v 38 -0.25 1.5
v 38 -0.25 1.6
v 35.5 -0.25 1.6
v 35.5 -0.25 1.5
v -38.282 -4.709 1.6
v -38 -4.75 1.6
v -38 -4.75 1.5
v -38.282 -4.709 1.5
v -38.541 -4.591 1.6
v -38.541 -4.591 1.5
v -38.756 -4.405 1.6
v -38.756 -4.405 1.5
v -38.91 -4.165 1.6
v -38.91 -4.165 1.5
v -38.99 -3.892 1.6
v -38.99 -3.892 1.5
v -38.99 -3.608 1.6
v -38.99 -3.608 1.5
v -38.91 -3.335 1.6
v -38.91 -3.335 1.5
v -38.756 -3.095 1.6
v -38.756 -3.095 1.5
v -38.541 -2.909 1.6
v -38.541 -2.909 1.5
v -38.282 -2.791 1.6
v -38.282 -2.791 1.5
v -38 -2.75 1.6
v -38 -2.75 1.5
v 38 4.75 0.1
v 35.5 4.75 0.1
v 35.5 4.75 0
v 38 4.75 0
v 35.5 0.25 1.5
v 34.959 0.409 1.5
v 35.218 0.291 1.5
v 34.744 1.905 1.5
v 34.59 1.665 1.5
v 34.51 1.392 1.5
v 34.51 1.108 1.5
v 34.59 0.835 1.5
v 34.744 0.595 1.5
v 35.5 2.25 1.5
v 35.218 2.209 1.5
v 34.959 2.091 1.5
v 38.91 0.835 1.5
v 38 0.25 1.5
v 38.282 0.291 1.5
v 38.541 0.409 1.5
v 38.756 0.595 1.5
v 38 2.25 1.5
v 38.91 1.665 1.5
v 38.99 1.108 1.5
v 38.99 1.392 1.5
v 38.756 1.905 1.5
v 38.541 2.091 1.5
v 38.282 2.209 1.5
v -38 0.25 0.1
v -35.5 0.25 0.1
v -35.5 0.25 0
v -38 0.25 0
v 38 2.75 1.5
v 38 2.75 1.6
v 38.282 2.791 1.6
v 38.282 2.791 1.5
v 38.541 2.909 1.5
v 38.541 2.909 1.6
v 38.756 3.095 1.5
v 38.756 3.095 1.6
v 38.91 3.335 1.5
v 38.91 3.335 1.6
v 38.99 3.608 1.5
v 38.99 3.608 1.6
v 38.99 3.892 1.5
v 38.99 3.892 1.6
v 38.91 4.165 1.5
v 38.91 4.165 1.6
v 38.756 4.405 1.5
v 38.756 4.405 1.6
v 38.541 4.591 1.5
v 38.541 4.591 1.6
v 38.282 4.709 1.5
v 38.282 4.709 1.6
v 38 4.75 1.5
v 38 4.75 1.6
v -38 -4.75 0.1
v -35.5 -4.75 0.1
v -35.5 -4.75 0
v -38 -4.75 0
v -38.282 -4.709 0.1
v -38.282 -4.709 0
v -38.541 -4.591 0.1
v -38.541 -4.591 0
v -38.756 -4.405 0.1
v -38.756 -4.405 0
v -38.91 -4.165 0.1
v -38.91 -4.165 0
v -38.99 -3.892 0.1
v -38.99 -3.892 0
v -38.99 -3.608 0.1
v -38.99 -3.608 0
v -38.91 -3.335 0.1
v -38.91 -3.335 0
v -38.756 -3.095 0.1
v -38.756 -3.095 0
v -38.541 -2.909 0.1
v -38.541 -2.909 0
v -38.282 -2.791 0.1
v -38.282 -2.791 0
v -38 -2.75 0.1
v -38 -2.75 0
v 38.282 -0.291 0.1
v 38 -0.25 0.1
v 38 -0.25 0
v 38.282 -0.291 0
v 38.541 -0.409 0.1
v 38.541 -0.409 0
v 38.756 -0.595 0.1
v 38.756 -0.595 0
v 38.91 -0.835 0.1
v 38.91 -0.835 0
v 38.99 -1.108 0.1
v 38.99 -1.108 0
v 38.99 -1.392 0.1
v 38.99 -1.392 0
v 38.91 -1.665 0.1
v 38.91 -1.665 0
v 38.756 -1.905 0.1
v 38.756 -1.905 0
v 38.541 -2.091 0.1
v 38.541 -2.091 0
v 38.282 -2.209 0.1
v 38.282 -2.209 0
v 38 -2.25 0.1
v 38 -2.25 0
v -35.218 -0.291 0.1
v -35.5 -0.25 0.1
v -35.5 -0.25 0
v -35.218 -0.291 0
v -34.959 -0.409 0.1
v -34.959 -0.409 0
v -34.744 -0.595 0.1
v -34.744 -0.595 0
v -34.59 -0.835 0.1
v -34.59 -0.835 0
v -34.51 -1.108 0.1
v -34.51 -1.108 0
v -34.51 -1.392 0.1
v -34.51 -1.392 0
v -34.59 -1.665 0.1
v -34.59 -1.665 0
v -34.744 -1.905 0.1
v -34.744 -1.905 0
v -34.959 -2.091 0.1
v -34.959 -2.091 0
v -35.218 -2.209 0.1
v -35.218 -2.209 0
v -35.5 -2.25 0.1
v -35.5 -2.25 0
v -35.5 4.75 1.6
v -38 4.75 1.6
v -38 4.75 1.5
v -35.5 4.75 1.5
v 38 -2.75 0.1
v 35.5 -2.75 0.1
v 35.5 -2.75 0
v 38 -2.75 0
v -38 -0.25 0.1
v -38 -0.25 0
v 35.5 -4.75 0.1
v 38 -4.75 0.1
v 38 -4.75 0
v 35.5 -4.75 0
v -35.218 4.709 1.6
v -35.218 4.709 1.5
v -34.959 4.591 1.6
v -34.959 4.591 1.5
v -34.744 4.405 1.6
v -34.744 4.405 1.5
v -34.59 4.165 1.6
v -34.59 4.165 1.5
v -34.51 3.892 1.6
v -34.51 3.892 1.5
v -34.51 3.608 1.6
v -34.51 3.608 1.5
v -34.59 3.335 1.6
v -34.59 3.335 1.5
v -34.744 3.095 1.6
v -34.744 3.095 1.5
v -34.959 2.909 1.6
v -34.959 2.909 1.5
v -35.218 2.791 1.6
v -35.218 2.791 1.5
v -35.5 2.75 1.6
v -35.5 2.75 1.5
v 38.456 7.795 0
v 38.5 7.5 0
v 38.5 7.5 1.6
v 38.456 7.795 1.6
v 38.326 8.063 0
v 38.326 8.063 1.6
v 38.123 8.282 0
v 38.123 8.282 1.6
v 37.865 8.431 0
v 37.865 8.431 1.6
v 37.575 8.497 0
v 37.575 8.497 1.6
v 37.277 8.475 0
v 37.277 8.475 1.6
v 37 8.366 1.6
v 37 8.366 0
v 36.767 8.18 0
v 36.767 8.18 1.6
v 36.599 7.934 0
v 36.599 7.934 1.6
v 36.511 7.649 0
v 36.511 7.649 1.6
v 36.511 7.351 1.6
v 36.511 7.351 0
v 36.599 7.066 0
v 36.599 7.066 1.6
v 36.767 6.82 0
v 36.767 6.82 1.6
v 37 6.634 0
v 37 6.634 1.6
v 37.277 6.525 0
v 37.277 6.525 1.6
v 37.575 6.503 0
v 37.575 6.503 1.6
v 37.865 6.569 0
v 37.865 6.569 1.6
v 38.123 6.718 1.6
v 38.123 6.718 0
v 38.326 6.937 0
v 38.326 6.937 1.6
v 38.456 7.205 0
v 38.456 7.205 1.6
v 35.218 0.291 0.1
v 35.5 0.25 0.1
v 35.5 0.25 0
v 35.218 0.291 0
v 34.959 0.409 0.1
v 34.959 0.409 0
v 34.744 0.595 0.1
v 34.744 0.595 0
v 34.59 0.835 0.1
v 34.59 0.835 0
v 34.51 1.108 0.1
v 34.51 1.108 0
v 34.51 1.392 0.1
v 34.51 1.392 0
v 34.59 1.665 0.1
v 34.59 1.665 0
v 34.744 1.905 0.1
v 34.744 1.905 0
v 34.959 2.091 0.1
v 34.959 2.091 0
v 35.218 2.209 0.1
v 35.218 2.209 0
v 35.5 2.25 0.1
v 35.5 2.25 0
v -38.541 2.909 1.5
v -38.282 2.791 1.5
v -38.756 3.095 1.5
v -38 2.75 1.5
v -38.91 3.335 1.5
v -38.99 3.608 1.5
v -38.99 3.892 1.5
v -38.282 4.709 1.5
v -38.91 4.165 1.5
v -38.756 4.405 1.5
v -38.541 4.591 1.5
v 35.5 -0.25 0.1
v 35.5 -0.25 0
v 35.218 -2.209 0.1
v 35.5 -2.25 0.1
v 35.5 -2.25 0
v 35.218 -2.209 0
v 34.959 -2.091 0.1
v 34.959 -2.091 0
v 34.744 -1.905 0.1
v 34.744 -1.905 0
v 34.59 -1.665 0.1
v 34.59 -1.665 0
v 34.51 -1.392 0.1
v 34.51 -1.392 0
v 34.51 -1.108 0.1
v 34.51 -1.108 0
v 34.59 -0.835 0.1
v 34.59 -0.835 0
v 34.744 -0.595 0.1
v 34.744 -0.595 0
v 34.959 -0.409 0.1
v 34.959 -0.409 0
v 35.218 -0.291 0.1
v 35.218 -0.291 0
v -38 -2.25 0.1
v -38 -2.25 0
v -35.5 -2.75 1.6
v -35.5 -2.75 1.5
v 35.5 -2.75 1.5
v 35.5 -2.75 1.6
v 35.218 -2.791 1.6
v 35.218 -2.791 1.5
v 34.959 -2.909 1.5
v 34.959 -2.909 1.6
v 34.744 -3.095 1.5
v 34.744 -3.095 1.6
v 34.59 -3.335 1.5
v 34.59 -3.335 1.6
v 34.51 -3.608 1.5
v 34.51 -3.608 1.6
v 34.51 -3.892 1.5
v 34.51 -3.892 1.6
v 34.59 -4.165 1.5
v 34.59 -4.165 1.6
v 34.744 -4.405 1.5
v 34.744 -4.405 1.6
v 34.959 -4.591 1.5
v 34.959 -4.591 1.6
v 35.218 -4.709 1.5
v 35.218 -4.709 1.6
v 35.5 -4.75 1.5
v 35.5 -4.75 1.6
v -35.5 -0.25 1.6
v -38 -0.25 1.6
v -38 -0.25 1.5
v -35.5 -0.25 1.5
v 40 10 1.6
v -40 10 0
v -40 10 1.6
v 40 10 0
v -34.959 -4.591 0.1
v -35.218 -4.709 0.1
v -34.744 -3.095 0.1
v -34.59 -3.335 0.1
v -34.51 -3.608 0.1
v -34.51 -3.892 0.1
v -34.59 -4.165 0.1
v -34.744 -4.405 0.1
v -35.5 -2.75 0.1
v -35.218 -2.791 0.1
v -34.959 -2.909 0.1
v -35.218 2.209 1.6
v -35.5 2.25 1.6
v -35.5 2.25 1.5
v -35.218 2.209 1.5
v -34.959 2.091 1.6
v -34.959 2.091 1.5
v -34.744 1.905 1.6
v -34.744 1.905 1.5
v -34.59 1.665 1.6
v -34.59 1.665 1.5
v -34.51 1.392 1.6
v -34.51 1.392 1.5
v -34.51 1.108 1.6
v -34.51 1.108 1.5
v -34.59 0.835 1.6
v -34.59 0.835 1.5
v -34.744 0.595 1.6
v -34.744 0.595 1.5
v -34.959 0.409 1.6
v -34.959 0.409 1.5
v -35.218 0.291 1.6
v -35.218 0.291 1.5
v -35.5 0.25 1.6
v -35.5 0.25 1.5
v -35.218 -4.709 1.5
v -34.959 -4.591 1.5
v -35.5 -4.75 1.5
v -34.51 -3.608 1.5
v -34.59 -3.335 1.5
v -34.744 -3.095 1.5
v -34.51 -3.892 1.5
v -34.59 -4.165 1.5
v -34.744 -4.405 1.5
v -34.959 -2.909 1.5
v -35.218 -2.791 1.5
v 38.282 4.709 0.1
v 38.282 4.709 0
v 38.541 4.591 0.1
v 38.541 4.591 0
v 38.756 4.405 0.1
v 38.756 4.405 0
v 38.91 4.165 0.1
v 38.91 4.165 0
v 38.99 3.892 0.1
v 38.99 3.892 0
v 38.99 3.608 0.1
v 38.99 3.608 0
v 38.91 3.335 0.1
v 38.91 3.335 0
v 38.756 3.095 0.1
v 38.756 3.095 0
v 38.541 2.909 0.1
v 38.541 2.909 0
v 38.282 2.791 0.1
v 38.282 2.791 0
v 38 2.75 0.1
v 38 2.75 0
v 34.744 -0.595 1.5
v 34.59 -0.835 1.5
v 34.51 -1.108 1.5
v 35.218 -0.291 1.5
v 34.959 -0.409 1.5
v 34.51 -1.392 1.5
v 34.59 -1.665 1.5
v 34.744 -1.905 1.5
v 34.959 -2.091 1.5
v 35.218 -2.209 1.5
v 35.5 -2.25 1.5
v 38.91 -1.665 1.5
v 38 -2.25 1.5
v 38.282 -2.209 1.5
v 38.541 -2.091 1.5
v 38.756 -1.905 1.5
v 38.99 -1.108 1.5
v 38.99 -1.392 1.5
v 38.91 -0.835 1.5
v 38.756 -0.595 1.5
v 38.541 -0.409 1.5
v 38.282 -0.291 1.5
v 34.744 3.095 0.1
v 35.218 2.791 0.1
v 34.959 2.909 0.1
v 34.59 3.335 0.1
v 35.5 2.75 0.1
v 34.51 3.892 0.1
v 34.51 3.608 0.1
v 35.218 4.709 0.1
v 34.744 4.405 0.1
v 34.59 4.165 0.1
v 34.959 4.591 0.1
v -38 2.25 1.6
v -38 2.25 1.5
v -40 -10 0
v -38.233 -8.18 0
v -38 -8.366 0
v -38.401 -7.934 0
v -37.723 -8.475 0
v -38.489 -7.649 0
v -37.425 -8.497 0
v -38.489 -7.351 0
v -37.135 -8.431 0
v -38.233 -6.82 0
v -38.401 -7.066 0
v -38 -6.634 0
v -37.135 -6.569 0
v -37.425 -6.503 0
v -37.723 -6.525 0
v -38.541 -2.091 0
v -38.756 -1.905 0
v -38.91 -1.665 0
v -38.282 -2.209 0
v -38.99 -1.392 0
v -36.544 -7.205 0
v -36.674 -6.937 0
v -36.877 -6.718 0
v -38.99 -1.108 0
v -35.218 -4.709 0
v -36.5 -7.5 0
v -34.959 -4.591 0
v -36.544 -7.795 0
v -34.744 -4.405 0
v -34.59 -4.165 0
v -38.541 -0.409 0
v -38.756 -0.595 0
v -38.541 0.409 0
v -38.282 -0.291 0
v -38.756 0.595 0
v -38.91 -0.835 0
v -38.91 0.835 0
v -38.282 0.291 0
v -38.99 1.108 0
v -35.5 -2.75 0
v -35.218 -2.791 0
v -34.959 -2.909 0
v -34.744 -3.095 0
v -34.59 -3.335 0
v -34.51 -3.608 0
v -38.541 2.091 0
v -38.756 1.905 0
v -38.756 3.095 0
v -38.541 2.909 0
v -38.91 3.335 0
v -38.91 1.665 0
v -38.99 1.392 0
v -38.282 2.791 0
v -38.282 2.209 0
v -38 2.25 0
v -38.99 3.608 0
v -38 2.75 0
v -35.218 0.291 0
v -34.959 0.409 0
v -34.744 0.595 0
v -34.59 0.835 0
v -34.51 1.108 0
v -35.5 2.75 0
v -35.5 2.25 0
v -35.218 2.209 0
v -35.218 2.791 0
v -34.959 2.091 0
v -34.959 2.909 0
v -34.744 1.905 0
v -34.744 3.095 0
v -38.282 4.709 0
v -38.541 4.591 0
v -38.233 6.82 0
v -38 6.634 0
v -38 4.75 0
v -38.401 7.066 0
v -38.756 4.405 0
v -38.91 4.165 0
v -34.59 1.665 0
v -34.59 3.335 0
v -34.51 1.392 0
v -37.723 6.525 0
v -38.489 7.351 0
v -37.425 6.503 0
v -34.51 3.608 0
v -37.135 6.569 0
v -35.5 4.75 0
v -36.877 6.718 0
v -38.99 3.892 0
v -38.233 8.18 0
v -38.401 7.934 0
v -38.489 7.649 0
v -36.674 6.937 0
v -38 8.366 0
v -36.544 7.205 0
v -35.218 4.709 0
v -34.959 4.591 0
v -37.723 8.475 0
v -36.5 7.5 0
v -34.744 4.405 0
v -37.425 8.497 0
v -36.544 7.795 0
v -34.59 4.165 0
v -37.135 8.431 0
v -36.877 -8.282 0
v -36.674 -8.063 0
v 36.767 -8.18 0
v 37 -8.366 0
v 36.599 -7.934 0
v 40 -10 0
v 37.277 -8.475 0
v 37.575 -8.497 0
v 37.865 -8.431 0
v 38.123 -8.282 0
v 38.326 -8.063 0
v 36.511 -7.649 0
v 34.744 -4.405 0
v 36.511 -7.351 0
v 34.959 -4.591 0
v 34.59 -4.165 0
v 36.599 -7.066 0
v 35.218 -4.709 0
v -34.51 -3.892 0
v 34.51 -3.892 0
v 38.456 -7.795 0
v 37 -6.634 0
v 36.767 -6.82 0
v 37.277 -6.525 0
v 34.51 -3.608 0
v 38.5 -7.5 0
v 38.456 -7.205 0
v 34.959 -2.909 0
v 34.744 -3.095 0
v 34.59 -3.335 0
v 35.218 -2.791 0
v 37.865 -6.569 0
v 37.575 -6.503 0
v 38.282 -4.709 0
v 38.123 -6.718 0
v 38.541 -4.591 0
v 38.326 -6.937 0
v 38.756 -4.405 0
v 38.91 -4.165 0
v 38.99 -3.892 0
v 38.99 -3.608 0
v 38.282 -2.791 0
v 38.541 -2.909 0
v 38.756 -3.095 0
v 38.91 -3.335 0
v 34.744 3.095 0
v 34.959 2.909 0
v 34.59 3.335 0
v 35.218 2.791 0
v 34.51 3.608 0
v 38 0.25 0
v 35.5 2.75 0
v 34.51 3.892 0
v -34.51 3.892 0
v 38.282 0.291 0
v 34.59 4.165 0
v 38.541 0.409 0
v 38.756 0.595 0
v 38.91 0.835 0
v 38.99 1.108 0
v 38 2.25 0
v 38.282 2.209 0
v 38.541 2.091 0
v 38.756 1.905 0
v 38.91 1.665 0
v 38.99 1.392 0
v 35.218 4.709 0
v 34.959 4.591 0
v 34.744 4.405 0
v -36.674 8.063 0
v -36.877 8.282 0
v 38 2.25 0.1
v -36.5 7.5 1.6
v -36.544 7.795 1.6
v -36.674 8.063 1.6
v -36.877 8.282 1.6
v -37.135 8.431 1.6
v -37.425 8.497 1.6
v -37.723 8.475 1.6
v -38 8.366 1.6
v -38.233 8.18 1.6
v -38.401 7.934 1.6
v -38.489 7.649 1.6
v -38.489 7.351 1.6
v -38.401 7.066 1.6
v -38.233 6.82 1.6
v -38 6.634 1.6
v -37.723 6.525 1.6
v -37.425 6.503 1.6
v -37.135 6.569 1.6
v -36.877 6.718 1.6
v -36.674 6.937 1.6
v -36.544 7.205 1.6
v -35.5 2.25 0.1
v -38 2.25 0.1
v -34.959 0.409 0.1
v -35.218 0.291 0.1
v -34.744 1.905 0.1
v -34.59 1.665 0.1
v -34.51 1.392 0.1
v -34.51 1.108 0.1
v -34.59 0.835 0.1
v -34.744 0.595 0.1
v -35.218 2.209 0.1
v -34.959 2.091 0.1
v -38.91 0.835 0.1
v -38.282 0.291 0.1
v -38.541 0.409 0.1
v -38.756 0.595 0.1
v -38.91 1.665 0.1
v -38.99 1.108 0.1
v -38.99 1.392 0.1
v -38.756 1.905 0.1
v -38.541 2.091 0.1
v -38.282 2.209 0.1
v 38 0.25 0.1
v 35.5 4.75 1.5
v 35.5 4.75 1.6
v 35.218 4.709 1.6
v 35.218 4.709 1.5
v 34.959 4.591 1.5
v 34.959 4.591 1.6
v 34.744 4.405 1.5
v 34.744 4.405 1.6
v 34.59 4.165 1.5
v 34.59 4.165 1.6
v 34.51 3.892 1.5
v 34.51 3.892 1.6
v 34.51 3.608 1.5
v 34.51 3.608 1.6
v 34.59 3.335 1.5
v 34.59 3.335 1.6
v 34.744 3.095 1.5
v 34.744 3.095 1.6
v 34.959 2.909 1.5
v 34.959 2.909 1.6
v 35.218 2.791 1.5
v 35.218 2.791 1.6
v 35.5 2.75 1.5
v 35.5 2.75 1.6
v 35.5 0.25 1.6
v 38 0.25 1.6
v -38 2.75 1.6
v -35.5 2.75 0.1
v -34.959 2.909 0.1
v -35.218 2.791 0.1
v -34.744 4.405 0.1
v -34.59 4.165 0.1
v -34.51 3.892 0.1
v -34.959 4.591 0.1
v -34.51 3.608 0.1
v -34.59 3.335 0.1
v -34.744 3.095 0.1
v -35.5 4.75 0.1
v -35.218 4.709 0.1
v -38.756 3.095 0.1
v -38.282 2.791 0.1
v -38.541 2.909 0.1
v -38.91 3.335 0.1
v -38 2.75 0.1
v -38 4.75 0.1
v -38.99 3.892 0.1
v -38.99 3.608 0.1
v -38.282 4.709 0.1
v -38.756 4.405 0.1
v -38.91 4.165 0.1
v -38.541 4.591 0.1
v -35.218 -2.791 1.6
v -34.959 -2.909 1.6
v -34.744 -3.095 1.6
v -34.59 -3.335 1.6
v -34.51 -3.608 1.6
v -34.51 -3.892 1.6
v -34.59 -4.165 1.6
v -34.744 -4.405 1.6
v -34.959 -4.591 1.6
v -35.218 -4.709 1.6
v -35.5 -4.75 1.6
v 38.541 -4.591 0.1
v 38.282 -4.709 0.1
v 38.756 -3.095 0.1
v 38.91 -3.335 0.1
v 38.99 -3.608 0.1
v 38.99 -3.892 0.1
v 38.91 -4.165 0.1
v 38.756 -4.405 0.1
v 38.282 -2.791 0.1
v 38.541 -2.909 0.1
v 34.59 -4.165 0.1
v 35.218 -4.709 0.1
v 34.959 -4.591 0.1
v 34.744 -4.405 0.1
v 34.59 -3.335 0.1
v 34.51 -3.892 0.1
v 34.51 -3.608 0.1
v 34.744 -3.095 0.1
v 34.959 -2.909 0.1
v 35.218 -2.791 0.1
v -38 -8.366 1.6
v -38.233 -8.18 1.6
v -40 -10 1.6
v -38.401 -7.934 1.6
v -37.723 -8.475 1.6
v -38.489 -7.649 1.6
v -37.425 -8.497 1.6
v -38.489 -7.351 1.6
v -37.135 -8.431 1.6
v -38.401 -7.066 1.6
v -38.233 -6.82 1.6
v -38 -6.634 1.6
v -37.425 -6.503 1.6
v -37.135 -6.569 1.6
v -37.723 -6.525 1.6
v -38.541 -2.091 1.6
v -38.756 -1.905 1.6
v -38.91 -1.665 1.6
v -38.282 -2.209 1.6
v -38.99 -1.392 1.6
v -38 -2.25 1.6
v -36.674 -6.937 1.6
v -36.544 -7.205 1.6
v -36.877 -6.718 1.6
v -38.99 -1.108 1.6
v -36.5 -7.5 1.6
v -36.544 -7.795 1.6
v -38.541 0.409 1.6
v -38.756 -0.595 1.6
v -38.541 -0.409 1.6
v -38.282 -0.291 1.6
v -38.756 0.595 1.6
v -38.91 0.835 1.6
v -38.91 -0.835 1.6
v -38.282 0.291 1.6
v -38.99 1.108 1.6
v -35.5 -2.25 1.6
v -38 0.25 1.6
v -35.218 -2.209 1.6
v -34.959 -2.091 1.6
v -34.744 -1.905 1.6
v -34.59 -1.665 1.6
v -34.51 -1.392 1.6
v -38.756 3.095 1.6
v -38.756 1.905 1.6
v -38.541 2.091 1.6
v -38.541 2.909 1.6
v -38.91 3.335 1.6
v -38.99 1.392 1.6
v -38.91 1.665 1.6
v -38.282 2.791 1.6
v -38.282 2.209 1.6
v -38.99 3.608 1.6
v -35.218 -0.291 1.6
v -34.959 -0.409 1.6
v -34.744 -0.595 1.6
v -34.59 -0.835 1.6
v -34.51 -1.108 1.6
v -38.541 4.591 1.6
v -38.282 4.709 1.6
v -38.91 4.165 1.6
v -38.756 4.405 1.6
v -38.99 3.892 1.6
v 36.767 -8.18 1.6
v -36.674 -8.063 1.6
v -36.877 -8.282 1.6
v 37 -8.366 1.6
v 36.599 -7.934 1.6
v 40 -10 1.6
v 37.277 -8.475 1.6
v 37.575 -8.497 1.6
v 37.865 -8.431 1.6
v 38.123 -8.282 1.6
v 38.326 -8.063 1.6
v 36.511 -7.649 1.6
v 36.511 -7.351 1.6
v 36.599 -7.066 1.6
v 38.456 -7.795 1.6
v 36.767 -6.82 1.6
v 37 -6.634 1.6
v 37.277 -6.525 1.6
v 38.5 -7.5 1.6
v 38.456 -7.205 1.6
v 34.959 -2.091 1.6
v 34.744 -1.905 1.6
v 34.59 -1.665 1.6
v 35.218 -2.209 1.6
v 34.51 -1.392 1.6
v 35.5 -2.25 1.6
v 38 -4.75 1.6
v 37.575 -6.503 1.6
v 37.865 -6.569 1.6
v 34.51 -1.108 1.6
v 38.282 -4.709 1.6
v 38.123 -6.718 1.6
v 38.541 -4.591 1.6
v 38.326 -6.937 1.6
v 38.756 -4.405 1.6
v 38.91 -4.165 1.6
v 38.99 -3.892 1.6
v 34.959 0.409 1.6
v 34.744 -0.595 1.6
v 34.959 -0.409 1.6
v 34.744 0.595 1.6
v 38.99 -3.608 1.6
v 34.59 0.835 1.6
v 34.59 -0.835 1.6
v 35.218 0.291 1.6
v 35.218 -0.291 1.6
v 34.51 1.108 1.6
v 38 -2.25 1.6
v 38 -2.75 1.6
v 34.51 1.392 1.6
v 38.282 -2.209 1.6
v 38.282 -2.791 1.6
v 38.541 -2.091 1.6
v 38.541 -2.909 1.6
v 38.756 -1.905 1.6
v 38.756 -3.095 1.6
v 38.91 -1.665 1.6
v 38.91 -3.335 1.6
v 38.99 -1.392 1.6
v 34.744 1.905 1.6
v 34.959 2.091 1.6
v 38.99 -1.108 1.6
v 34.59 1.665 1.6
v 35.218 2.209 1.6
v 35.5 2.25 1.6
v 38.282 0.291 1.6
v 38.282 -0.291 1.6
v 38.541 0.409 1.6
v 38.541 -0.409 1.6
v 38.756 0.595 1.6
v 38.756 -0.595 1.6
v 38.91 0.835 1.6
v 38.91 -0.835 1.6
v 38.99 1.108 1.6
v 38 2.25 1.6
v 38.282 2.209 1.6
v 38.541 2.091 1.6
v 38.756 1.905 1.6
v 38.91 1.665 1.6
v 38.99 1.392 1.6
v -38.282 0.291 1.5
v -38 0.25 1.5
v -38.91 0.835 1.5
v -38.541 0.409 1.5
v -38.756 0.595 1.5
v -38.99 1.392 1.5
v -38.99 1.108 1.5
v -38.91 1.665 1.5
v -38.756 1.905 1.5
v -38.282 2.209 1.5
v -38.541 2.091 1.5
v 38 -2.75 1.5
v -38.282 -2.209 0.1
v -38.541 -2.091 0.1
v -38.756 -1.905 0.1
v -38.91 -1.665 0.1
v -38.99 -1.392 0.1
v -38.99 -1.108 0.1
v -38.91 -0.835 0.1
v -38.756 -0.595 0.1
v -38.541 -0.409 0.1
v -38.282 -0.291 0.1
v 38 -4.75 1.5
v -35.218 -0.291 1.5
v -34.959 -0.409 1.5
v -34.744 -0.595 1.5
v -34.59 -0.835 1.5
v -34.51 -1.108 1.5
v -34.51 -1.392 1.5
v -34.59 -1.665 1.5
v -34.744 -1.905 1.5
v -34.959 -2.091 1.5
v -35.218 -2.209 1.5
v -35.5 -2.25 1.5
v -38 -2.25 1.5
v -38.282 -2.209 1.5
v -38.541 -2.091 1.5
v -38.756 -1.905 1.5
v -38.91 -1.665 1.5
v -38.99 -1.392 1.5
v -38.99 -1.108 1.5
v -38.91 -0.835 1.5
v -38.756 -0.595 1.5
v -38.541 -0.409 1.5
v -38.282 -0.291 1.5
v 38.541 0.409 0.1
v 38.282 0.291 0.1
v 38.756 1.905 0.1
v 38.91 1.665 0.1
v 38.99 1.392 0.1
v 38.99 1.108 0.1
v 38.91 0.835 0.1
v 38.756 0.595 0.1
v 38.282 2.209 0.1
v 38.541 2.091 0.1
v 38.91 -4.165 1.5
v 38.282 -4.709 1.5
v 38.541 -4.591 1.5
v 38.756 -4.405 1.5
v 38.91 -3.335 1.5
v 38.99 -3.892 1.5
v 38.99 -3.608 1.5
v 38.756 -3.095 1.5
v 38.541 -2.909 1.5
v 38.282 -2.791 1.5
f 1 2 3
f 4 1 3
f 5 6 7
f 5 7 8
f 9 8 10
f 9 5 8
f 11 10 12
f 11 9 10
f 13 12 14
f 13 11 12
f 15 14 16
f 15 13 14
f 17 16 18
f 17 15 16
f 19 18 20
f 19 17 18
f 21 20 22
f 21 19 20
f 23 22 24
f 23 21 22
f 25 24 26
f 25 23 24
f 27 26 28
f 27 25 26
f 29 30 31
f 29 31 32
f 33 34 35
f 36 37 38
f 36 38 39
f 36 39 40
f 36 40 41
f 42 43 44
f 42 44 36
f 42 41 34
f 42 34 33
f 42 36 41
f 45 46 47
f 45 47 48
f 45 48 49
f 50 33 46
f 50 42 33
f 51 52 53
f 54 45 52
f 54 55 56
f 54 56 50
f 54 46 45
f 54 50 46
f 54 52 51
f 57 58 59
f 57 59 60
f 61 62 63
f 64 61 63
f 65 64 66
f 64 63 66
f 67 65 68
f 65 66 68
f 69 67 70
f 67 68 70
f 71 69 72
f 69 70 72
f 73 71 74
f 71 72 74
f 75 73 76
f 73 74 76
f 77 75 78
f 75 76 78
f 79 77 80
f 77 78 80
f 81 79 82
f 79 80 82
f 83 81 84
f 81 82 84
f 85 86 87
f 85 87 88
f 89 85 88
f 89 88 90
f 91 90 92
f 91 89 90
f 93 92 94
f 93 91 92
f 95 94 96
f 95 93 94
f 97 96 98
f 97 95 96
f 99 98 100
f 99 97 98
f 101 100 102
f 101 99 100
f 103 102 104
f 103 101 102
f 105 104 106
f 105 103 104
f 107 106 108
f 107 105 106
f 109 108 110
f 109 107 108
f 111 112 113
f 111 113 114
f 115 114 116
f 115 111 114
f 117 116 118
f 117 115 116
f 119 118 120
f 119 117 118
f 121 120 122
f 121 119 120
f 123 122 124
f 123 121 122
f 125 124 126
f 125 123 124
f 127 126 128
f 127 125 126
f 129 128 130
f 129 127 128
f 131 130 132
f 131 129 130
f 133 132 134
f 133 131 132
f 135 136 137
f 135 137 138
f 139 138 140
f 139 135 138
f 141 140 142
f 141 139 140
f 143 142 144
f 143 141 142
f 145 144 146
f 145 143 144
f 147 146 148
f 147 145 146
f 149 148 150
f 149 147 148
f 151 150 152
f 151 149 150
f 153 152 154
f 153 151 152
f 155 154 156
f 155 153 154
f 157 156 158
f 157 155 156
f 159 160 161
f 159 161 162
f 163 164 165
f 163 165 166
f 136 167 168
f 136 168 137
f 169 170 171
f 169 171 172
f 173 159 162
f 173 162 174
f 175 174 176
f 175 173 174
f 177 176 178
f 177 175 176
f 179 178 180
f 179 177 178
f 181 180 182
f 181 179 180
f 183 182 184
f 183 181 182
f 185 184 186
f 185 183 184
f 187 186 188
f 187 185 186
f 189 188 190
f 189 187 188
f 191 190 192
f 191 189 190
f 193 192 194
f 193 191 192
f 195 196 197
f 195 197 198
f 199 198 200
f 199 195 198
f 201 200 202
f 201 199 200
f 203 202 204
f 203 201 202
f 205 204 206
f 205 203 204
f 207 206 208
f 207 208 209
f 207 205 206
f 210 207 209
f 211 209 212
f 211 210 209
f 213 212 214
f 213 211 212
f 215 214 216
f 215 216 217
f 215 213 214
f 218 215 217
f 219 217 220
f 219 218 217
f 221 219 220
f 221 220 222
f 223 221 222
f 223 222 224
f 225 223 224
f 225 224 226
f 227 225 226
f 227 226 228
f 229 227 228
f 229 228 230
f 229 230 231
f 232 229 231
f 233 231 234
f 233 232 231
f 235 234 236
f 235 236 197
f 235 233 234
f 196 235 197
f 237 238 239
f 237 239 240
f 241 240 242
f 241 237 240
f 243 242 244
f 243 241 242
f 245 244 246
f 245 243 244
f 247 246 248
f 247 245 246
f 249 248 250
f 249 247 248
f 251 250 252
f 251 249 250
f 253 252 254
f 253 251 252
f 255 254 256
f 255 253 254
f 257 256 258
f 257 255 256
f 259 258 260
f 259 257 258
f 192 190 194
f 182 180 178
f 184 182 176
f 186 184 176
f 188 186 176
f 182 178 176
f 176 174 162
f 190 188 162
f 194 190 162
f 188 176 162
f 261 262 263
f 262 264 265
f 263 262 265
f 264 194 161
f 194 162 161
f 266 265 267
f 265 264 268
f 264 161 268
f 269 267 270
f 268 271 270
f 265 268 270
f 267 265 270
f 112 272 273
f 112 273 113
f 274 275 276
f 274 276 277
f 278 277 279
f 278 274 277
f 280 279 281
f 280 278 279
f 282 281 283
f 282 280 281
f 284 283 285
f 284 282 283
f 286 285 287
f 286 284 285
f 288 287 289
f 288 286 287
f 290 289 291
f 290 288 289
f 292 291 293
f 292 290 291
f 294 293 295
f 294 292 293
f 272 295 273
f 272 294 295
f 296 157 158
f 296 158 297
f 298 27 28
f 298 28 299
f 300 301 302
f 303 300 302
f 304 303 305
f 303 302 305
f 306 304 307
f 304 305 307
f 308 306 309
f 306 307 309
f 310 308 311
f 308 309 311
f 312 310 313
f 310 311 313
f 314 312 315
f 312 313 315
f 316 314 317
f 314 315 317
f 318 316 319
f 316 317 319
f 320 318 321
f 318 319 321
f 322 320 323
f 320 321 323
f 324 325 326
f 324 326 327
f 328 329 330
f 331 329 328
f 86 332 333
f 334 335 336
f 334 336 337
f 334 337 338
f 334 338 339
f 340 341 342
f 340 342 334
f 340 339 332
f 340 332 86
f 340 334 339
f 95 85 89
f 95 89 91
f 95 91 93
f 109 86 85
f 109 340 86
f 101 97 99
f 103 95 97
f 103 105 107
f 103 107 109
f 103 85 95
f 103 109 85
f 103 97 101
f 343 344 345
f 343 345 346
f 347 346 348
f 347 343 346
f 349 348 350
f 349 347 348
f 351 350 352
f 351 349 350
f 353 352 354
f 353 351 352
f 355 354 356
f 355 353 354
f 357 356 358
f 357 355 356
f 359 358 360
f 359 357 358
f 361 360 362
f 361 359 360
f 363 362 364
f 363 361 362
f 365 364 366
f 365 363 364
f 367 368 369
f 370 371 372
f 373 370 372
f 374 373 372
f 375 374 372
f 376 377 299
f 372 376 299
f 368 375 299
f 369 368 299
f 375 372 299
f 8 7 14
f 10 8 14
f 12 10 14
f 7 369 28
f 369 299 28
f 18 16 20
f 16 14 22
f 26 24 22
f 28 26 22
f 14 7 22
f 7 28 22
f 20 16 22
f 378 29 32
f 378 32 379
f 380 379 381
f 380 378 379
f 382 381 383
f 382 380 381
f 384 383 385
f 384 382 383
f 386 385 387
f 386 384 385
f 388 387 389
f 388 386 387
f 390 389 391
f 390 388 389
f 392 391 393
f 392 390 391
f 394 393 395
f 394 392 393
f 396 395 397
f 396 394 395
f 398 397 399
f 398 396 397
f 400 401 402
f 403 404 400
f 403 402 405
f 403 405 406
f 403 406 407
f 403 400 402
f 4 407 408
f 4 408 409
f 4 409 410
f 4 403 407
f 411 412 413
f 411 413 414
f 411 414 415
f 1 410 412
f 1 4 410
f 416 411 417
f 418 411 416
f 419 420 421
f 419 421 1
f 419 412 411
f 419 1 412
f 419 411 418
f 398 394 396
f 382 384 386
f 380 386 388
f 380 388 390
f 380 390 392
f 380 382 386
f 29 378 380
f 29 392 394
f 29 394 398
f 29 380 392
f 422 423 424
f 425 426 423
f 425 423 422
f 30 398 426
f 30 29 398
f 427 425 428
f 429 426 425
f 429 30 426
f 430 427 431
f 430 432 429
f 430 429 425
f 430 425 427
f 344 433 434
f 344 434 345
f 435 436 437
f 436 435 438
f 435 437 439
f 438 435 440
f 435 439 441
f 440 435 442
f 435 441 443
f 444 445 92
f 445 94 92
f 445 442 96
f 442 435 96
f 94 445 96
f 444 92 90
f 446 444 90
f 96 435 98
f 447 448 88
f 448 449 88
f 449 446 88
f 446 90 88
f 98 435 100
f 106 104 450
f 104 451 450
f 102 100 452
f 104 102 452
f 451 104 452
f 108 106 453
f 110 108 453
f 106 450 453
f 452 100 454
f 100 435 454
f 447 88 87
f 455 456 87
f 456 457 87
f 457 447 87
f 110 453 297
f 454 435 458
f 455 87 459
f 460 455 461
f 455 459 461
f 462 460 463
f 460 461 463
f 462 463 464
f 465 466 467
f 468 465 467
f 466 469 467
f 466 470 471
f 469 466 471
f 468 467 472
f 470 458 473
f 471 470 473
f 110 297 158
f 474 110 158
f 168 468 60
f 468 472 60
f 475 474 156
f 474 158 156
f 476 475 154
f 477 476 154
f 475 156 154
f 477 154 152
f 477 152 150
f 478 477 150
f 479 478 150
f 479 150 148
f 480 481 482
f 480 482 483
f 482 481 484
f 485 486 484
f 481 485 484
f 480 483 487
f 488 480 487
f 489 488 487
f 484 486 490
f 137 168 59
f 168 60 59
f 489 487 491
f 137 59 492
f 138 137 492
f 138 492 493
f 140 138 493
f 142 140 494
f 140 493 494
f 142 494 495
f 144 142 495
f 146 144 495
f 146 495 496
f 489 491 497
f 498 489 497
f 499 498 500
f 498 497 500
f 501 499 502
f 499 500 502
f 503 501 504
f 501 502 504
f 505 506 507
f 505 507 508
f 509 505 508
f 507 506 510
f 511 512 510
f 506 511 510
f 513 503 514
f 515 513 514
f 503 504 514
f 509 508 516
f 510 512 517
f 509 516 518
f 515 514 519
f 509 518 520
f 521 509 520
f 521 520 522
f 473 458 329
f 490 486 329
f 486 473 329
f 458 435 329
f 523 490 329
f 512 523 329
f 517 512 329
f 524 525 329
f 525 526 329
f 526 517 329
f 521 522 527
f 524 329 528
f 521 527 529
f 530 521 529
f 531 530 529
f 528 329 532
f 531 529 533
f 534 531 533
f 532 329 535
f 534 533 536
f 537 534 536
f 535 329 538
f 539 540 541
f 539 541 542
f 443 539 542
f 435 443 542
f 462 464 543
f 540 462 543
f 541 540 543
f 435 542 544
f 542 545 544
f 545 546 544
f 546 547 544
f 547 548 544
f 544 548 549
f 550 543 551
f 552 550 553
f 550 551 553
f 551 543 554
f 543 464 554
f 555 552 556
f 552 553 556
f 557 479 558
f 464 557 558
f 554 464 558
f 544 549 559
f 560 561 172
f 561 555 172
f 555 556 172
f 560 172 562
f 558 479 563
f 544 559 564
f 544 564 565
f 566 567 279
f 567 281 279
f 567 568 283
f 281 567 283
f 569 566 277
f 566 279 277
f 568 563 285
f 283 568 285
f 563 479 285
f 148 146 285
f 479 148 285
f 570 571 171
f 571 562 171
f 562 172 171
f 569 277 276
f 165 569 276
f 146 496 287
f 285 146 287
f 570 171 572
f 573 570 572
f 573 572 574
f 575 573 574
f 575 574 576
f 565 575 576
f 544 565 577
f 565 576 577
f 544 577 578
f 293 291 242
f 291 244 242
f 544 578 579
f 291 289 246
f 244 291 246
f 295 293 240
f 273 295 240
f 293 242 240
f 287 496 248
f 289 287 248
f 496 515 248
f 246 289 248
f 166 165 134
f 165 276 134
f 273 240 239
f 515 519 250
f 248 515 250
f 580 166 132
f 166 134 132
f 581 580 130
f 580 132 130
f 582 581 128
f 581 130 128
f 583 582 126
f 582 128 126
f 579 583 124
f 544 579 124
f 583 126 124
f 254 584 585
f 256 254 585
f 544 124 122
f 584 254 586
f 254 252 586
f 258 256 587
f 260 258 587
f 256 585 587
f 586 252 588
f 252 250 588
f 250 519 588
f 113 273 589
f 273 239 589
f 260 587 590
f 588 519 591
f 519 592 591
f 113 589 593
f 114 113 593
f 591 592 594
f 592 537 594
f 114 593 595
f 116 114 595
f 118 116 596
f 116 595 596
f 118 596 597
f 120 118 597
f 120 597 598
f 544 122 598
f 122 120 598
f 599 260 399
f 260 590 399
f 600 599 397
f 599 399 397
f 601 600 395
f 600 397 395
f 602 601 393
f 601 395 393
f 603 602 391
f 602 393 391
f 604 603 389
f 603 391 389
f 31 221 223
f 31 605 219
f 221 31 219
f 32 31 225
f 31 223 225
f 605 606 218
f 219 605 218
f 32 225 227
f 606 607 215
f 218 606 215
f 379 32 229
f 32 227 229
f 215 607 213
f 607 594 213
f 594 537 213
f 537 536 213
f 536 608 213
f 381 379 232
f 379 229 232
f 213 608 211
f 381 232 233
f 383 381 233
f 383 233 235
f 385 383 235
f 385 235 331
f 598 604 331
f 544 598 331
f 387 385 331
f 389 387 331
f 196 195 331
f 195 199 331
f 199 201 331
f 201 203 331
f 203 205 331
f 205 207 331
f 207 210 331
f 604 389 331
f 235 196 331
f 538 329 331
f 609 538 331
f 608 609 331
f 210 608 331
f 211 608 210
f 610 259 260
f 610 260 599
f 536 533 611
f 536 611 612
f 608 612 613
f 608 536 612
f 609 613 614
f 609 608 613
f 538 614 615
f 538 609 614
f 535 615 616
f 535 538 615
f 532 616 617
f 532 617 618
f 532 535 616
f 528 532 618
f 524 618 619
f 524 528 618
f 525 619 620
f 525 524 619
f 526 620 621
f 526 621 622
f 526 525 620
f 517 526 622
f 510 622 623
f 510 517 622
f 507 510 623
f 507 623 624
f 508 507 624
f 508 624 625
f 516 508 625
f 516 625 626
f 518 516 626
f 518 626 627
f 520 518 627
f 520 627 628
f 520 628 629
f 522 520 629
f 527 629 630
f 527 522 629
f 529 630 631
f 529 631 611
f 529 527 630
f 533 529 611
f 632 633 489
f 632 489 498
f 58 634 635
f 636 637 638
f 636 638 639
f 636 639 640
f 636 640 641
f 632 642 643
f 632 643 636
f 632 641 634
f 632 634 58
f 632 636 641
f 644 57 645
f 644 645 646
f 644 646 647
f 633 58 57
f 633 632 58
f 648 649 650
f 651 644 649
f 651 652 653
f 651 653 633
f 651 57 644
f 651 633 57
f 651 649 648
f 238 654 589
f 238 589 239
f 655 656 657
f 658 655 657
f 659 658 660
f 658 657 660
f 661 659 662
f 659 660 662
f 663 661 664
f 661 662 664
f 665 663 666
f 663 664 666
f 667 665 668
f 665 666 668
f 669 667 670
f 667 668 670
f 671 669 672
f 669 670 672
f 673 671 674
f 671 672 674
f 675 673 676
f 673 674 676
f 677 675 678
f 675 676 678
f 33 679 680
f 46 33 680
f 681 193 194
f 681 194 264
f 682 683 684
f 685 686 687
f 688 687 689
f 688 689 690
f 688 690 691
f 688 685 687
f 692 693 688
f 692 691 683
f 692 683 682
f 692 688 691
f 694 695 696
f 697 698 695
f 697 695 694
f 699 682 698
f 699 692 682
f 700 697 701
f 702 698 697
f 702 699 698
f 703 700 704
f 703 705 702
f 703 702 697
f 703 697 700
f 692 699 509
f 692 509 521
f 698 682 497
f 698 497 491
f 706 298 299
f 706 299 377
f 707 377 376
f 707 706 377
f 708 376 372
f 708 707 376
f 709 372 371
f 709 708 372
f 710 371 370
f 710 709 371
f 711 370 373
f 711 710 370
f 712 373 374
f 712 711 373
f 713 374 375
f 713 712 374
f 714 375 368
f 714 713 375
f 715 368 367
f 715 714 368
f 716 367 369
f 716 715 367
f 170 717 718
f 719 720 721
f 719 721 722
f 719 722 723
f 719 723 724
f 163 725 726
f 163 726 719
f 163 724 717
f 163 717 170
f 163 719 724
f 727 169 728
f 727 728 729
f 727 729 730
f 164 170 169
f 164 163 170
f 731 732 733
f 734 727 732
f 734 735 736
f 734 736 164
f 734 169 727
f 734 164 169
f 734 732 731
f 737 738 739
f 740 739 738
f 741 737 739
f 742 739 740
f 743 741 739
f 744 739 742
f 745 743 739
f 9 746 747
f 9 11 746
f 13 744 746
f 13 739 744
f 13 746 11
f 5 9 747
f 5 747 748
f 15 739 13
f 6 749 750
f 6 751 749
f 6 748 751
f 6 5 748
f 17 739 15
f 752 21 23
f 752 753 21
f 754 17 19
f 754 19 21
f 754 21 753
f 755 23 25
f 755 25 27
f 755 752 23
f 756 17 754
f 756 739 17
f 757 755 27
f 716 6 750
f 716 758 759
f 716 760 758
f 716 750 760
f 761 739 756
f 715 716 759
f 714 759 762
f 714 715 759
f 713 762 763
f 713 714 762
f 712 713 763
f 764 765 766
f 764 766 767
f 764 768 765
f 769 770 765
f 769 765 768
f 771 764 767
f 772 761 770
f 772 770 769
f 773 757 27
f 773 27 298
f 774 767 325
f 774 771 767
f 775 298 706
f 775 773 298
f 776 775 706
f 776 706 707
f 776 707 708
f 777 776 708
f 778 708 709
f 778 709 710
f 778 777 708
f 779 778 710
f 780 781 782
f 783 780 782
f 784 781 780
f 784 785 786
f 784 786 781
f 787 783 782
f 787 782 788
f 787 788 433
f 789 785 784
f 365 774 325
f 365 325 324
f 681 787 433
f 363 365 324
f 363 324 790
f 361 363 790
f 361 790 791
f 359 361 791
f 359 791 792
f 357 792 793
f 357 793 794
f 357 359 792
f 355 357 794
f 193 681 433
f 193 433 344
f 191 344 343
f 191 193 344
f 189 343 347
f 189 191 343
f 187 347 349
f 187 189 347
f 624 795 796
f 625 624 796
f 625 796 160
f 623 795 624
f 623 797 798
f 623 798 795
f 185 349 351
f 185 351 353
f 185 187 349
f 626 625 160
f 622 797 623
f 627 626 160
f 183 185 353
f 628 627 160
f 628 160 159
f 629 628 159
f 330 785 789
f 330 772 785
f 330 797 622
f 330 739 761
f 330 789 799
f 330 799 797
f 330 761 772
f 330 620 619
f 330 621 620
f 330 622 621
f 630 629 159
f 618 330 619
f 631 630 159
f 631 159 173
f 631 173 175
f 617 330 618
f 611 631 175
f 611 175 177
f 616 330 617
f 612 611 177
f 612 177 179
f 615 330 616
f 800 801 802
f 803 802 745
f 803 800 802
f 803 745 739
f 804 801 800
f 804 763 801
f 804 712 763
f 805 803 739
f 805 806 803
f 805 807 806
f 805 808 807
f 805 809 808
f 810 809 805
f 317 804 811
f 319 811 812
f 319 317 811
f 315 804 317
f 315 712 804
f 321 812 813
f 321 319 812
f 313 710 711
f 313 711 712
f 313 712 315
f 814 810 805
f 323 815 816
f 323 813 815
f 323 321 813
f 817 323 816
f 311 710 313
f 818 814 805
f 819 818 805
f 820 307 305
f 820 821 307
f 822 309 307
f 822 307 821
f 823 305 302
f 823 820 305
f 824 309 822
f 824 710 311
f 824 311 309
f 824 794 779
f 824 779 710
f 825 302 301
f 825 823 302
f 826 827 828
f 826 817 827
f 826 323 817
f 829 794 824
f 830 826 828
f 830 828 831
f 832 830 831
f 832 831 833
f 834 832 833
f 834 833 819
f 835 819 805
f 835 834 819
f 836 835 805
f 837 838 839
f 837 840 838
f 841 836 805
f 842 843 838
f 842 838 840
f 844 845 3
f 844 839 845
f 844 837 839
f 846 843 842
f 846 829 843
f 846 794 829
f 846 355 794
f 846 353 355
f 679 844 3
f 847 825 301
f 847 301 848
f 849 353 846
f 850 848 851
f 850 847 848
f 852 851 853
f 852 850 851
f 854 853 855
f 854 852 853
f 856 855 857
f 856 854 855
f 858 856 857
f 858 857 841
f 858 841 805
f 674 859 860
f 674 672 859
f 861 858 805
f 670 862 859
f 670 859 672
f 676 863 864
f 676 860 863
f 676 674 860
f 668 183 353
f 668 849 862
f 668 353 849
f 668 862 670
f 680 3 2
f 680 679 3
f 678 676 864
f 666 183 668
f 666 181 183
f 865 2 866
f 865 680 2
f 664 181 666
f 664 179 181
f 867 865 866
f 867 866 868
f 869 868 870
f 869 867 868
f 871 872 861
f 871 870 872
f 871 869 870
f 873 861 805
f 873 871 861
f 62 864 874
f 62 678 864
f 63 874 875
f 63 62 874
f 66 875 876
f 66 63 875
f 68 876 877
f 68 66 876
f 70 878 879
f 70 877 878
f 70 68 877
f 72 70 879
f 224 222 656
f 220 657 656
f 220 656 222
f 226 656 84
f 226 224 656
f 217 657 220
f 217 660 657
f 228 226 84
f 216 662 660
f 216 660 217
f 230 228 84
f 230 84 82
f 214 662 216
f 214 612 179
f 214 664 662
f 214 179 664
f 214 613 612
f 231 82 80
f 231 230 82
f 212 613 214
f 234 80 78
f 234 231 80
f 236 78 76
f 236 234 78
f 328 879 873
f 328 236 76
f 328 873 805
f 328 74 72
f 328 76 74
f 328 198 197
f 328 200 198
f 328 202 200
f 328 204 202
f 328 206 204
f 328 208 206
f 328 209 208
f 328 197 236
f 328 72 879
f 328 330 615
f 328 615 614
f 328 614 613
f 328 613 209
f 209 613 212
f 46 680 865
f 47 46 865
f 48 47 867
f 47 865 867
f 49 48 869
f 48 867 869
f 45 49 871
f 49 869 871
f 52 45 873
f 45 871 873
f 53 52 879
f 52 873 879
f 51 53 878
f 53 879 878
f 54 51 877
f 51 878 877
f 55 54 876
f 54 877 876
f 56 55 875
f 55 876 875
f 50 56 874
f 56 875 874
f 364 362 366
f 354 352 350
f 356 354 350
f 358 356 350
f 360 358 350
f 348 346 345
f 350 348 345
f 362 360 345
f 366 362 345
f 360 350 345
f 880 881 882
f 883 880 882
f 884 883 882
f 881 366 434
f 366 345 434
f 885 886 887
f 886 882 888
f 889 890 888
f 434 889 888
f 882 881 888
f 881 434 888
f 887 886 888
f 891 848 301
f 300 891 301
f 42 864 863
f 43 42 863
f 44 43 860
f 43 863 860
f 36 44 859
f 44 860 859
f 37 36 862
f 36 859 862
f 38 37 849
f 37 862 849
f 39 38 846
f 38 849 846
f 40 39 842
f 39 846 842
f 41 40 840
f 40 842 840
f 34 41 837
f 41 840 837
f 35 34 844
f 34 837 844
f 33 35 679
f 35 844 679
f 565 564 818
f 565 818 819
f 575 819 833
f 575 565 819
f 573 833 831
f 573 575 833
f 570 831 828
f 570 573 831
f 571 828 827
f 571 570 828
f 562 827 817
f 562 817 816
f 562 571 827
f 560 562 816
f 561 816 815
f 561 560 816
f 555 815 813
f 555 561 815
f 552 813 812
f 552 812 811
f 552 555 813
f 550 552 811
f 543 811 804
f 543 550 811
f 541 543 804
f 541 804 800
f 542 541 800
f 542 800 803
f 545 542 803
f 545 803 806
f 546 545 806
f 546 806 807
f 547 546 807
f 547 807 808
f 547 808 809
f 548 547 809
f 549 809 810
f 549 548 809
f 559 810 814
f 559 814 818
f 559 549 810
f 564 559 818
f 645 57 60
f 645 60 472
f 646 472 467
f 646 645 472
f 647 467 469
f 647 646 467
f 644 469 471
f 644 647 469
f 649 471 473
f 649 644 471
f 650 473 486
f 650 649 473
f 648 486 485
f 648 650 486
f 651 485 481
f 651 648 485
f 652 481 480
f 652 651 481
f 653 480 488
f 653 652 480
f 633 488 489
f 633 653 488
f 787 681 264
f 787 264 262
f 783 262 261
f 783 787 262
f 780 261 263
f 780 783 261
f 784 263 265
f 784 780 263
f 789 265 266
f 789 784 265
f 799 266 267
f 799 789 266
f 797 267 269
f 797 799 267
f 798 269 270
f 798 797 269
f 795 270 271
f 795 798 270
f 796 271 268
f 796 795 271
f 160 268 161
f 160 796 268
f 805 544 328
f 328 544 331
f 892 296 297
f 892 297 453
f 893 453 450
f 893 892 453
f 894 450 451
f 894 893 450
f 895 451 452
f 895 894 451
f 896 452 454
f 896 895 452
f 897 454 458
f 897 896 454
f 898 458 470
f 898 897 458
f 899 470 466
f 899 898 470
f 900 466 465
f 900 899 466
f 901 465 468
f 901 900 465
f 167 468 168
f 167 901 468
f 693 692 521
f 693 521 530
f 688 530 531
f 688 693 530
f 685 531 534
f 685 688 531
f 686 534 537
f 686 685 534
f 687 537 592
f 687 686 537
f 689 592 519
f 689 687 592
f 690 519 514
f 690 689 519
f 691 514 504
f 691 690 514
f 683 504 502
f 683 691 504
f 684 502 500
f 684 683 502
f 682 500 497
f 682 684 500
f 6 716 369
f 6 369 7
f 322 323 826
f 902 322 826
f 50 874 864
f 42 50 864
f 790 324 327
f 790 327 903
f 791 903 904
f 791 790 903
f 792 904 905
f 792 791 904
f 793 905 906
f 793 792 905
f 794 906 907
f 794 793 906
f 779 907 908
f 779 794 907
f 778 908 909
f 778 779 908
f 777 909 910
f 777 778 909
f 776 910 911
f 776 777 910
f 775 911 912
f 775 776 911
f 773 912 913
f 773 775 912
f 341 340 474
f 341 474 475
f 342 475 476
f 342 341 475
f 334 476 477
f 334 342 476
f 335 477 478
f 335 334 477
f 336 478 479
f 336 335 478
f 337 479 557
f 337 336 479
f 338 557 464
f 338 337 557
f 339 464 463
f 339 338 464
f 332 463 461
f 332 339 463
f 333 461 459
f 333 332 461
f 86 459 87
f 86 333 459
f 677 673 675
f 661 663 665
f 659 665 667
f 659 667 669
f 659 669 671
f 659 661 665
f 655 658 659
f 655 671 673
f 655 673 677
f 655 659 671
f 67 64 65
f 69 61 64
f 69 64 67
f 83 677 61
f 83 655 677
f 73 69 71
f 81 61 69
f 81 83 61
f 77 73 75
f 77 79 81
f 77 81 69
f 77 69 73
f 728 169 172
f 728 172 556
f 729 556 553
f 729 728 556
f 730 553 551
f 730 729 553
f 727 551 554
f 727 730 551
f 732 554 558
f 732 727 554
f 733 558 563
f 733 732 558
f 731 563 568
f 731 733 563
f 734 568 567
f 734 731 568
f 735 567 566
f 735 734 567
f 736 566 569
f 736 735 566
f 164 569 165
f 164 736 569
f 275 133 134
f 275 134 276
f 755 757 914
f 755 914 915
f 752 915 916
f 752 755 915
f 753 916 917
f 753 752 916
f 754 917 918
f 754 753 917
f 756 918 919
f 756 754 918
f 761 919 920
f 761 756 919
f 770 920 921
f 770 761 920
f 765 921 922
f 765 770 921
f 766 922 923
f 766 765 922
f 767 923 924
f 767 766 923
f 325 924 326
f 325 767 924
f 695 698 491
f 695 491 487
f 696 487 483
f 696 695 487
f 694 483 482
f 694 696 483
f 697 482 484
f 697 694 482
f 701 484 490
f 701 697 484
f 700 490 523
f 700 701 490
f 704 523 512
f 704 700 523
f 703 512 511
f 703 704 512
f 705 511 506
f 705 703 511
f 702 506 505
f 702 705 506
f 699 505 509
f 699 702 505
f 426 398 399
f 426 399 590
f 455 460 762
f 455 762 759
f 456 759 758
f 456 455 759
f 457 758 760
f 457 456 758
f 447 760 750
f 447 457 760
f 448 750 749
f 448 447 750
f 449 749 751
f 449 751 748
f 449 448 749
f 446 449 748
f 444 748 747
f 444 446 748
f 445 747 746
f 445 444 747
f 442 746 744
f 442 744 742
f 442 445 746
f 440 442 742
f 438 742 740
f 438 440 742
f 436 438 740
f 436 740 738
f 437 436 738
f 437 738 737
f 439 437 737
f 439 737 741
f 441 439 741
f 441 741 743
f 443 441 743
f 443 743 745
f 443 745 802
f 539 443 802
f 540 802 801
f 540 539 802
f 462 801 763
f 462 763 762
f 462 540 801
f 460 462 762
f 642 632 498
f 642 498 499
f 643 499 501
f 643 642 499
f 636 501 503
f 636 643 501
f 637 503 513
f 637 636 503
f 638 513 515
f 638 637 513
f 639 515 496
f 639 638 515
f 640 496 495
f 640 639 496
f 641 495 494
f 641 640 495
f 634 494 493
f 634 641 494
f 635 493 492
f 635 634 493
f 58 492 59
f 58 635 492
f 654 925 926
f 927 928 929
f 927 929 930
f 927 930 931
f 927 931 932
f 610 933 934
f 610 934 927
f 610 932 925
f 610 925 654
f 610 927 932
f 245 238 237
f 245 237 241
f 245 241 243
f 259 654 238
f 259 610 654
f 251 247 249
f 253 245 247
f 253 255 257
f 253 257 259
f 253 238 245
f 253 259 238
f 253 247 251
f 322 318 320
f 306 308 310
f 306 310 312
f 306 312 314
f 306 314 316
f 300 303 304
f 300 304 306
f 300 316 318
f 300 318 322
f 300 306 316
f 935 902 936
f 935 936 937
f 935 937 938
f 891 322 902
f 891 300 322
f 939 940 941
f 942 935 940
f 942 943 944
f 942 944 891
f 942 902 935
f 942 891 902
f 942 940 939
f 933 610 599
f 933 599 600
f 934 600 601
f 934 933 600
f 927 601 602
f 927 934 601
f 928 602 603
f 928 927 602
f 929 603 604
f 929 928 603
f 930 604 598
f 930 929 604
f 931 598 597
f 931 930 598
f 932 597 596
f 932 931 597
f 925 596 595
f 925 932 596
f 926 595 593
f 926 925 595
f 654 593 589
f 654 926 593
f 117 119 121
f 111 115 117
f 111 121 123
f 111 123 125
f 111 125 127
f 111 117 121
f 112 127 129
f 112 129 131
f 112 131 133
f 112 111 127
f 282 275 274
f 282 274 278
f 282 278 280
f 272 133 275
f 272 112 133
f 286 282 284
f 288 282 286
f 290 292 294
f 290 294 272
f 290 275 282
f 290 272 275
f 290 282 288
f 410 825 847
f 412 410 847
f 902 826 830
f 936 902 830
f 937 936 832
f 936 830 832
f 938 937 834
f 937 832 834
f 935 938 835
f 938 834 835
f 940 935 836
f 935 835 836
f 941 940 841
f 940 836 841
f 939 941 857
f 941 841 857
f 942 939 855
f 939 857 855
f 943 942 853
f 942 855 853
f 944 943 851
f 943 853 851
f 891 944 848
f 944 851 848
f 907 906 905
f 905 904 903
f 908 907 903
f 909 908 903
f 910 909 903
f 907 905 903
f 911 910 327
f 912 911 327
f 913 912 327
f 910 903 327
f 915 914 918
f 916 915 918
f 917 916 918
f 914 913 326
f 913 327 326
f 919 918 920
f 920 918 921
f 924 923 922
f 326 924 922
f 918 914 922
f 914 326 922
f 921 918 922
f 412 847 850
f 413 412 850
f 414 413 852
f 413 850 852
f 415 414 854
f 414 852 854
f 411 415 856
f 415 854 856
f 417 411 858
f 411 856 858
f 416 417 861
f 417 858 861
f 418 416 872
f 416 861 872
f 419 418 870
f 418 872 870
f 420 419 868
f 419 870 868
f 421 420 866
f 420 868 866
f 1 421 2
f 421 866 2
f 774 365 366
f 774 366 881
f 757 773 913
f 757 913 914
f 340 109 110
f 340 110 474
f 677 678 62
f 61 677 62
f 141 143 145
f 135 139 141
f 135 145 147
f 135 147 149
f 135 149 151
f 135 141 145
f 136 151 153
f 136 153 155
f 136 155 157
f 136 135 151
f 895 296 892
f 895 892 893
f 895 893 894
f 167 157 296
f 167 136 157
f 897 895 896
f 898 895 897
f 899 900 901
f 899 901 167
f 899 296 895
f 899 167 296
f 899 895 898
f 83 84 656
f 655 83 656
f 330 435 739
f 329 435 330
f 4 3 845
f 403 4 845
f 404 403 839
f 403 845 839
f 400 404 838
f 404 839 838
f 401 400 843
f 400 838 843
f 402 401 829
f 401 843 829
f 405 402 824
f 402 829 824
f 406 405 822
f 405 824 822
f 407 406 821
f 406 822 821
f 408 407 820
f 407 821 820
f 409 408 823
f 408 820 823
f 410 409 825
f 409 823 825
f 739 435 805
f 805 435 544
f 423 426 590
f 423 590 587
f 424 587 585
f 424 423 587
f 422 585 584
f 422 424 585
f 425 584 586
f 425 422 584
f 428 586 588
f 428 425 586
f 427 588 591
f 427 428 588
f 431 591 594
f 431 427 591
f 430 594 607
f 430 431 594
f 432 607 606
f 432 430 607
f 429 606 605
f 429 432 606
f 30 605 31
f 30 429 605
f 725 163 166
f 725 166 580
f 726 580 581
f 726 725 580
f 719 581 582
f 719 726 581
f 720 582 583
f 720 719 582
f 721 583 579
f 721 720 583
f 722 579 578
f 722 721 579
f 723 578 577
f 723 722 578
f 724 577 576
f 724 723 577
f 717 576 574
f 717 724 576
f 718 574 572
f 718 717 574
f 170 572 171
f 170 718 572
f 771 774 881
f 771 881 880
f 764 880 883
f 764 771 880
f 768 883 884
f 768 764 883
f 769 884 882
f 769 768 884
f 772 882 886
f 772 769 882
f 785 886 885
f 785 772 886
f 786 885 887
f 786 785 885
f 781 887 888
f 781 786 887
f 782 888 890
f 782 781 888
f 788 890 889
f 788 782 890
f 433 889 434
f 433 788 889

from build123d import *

# Parameters (mm, degrees)
SKETCH_1_W          = 80
SKETCH_1_H          = 20
SKETCH_1_R          = 1
EXTRUDE_1_DEPTH     = 1.6
CUT_EXTRUDE_1_DEPTH = 0.1
CUT_EXTRUDE_START   = -0.1
CUT_EXTRUDE_2_DEPTH = 0.1


with BuildPart() as part:
    # Эскиз1 → Бобышка-Вытянуть1 (new body)
    with BuildSketch(Plane.XY):
        Rectangle(SKETCH_1_W, SKETCH_1_H)
        with Locations((-37.5, 7.5)):
            Circle(SKETCH_1_R, mode=Mode.SUBTRACT)
        with Locations((-37.5, -7.5)):
            Circle(SKETCH_1_R, mode=Mode.SUBTRACT)
        with Locations((37.5, -7.5)):
            Circle(SKETCH_1_R, mode=Mode.SUBTRACT)
        with Locations((37.5, 7.5)):
            Circle(SKETCH_1_R, mode=Mode.SUBTRACT)
    extrude(amount=EXTRUDE_1_DEPTH)

    # Эскиз2 → Вырез-Вытянуть1 (cut)
    with BuildSketch(Plane.XY.offset(1.6)):
        with BuildLine():
            Line((-38, -2.75), (-35.5, -2.75))
            ThreePointArc((-35.5, -2.75), (-34.5, -3.75), (-35.5, -4.75))
            Line((-35.5, -4.75), (-38, -4.75))
            ThreePointArc((-38, -4.75), (-39, -3.75), (-38, -2.75))
        make_face()
        with BuildLine():
            Line((-38, -0.25), (-35.5, -0.25))
            ThreePointArc((-35.5, -0.25), (-34.5, -1.25), (-35.5, -2.25))
            Line((-35.5, -2.25), (-38, -2.25))
            ThreePointArc((-38, -2.25), (-39, -1.25), (-38, -0.25))
        make_face()
        with BuildLine():
            Line((-38, 2.25), (-35.5, 2.25))
            ThreePointArc((-35.5, 2.25), (-34.5, 1.25), (-35.5, 0.25))
            Line((-35.5, 0.25), (-38, 0.25))
            ThreePointArc((-38, 0.25), (-39, 1.25), (-38, 2.25))
        make_face()
        with BuildLine():
            Line((38, -2.75), (35.5, -2.75))
            ThreePointArc((35.5, -2.75), (34.5, -3.75), (35.5, -4.75))
            Line((35.5, -4.75), (38, -4.75))
            ThreePointArc((38, -4.75), (39, -3.75), (38, -2.75))
        make_face()
        with BuildLine():
            Line((-38, 4.75), (-35.5, 4.75))
            ThreePointArc((-35.5, 4.75), (-34.5, 3.75), (-35.5, 2.75))
            Line((-35.5, 2.75), (-38, 2.75))
            ThreePointArc((-38, 2.75), (-39, 3.75), (-38, 4.75))
        make_face()
        with BuildLine():
            Line((38, -0.25), (35.5, -0.25))
            ThreePointArc((35.5, -0.25), (34.5, -1.25), (35.5, -2.25))
            Line((35.5, -2.25), (38, -2.25))
            ThreePointArc((38, -2.25), (39, -1.25), (38, -0.25))
        make_face()
        with BuildLine():
            Line((38, 2.25), (35.5, 2.25))
            ThreePointArc((35.5, 2.25), (34.5, 1.25), (35.5, 0.25))
            Line((35.5, 0.25), (38, 0.25))
            ThreePointArc((38, 0.25), (39, 1.25), (38, 2.25))
        make_face()
        with BuildLine():
            Line((38, 4.75), (35.5, 4.75))
            ThreePointArc((35.5, 4.75), (34.5, 3.75), (35.5, 2.75))
            Line((35.5, 2.75), (38, 2.75))
            ThreePointArc((38, 2.75), (39, 3.75), (38, 4.75))
        make_face()
    extrude(amount=-CUT_EXTRUDE_1_DEPTH, mode=Mode.SUBTRACT)

    # Эскиз3 → Вырез-Вытянуть2 (cut)
    with BuildSketch(Plane(origin=(0, 0, 0), x_dir=(-1, 0, 0), z_dir=(0, 0, -1)).offset(CUT_EXTRUDE_START)):
        with BuildLine():
            Line((38, -0.25), (35.5, -0.25))
            ThreePointArc((35.5, -0.25), (34.5, -1.25), (35.5, -2.25))
            Line((35.5, -2.25), (38, -2.25))
            ThreePointArc((38, -2.25), (39, -1.25), (38, -0.25))
        make_face()
        with BuildLine():
            Line((38, -2.75), (35.5, -2.75))
            ThreePointArc((35.5, -2.75), (34.5, -3.75), (35.5, -4.75))
            Line((35.5, -4.75), (38, -4.75))
            ThreePointArc((38, -4.75), (39, -3.75), (38, -2.75))
        make_face()
        with BuildLine():
            Line((38, 2.25), (35.5, 2.25))
            ThreePointArc((35.5, 2.25), (34.5, 1.25), (35.5, 0.25))
            Line((35.5, 0.25), (38, 0.25))
            ThreePointArc((38, 0.25), (39, 1.25), (38, 2.25))
        make_face()
        with BuildLine():
            Line((-35.5, -0.25), (-38, -0.25))
            ThreePointArc((-38, -0.25), (-39, -1.25), (-38, -2.25))
            Line((-38, -2.25), (-35.5, -2.25))
            ThreePointArc((-35.5, -2.25), (-34.5, -1.25), (-35.5, -0.25))
        make_face()
        with BuildLine():
            Line((-35.5, -2.75), (-38, -2.75))
            ThreePointArc((-38, -2.75), (-39, -3.75), (-38, -4.75))
            Line((-38, -4.75), (-35.5, -4.75))
            ThreePointArc((-35.5, -4.75), (-34.5, -3.75), (-35.5, -2.75))
        make_face()
        with BuildLine():
            Line((-35.5, 2.25), (-38, 2.25))
            ThreePointArc((-38, 2.25), (-39, 1.25), (-38, 0.25))
            Line((-38, 0.25), (-35.5, 0.25))
            ThreePointArc((-35.5, 0.25), (-34.5, 1.25), (-35.5, 2.25))
        make_face()
        with BuildLine():
            Line((38, 4.75), (35.5, 4.75))
            ThreePointArc((35.5, 4.75), (34.5, 3.75), (35.5, 2.75))
            Line((35.5, 2.75), (38, 2.75))
            ThreePointArc((38, 2.75), (39, 3.75), (38, 4.75))
        make_face()
        with BuildLine():
            Line((-35.5, 4.75), (-38, 4.75))
            ThreePointArc((-38, 4.75), (-39, 3.75), (-38, 2.75))
            Line((-38, 2.75), (-35.5, 2.75))
            ThreePointArc((-35.5, 2.75), (-34.5, 3.75), (-35.5, 4.75))
        make_face()
    extrude(amount=CUT_EXTRUDE_2_DEPTH, mode=Mode.SUBTRACT)


solid = part.part
